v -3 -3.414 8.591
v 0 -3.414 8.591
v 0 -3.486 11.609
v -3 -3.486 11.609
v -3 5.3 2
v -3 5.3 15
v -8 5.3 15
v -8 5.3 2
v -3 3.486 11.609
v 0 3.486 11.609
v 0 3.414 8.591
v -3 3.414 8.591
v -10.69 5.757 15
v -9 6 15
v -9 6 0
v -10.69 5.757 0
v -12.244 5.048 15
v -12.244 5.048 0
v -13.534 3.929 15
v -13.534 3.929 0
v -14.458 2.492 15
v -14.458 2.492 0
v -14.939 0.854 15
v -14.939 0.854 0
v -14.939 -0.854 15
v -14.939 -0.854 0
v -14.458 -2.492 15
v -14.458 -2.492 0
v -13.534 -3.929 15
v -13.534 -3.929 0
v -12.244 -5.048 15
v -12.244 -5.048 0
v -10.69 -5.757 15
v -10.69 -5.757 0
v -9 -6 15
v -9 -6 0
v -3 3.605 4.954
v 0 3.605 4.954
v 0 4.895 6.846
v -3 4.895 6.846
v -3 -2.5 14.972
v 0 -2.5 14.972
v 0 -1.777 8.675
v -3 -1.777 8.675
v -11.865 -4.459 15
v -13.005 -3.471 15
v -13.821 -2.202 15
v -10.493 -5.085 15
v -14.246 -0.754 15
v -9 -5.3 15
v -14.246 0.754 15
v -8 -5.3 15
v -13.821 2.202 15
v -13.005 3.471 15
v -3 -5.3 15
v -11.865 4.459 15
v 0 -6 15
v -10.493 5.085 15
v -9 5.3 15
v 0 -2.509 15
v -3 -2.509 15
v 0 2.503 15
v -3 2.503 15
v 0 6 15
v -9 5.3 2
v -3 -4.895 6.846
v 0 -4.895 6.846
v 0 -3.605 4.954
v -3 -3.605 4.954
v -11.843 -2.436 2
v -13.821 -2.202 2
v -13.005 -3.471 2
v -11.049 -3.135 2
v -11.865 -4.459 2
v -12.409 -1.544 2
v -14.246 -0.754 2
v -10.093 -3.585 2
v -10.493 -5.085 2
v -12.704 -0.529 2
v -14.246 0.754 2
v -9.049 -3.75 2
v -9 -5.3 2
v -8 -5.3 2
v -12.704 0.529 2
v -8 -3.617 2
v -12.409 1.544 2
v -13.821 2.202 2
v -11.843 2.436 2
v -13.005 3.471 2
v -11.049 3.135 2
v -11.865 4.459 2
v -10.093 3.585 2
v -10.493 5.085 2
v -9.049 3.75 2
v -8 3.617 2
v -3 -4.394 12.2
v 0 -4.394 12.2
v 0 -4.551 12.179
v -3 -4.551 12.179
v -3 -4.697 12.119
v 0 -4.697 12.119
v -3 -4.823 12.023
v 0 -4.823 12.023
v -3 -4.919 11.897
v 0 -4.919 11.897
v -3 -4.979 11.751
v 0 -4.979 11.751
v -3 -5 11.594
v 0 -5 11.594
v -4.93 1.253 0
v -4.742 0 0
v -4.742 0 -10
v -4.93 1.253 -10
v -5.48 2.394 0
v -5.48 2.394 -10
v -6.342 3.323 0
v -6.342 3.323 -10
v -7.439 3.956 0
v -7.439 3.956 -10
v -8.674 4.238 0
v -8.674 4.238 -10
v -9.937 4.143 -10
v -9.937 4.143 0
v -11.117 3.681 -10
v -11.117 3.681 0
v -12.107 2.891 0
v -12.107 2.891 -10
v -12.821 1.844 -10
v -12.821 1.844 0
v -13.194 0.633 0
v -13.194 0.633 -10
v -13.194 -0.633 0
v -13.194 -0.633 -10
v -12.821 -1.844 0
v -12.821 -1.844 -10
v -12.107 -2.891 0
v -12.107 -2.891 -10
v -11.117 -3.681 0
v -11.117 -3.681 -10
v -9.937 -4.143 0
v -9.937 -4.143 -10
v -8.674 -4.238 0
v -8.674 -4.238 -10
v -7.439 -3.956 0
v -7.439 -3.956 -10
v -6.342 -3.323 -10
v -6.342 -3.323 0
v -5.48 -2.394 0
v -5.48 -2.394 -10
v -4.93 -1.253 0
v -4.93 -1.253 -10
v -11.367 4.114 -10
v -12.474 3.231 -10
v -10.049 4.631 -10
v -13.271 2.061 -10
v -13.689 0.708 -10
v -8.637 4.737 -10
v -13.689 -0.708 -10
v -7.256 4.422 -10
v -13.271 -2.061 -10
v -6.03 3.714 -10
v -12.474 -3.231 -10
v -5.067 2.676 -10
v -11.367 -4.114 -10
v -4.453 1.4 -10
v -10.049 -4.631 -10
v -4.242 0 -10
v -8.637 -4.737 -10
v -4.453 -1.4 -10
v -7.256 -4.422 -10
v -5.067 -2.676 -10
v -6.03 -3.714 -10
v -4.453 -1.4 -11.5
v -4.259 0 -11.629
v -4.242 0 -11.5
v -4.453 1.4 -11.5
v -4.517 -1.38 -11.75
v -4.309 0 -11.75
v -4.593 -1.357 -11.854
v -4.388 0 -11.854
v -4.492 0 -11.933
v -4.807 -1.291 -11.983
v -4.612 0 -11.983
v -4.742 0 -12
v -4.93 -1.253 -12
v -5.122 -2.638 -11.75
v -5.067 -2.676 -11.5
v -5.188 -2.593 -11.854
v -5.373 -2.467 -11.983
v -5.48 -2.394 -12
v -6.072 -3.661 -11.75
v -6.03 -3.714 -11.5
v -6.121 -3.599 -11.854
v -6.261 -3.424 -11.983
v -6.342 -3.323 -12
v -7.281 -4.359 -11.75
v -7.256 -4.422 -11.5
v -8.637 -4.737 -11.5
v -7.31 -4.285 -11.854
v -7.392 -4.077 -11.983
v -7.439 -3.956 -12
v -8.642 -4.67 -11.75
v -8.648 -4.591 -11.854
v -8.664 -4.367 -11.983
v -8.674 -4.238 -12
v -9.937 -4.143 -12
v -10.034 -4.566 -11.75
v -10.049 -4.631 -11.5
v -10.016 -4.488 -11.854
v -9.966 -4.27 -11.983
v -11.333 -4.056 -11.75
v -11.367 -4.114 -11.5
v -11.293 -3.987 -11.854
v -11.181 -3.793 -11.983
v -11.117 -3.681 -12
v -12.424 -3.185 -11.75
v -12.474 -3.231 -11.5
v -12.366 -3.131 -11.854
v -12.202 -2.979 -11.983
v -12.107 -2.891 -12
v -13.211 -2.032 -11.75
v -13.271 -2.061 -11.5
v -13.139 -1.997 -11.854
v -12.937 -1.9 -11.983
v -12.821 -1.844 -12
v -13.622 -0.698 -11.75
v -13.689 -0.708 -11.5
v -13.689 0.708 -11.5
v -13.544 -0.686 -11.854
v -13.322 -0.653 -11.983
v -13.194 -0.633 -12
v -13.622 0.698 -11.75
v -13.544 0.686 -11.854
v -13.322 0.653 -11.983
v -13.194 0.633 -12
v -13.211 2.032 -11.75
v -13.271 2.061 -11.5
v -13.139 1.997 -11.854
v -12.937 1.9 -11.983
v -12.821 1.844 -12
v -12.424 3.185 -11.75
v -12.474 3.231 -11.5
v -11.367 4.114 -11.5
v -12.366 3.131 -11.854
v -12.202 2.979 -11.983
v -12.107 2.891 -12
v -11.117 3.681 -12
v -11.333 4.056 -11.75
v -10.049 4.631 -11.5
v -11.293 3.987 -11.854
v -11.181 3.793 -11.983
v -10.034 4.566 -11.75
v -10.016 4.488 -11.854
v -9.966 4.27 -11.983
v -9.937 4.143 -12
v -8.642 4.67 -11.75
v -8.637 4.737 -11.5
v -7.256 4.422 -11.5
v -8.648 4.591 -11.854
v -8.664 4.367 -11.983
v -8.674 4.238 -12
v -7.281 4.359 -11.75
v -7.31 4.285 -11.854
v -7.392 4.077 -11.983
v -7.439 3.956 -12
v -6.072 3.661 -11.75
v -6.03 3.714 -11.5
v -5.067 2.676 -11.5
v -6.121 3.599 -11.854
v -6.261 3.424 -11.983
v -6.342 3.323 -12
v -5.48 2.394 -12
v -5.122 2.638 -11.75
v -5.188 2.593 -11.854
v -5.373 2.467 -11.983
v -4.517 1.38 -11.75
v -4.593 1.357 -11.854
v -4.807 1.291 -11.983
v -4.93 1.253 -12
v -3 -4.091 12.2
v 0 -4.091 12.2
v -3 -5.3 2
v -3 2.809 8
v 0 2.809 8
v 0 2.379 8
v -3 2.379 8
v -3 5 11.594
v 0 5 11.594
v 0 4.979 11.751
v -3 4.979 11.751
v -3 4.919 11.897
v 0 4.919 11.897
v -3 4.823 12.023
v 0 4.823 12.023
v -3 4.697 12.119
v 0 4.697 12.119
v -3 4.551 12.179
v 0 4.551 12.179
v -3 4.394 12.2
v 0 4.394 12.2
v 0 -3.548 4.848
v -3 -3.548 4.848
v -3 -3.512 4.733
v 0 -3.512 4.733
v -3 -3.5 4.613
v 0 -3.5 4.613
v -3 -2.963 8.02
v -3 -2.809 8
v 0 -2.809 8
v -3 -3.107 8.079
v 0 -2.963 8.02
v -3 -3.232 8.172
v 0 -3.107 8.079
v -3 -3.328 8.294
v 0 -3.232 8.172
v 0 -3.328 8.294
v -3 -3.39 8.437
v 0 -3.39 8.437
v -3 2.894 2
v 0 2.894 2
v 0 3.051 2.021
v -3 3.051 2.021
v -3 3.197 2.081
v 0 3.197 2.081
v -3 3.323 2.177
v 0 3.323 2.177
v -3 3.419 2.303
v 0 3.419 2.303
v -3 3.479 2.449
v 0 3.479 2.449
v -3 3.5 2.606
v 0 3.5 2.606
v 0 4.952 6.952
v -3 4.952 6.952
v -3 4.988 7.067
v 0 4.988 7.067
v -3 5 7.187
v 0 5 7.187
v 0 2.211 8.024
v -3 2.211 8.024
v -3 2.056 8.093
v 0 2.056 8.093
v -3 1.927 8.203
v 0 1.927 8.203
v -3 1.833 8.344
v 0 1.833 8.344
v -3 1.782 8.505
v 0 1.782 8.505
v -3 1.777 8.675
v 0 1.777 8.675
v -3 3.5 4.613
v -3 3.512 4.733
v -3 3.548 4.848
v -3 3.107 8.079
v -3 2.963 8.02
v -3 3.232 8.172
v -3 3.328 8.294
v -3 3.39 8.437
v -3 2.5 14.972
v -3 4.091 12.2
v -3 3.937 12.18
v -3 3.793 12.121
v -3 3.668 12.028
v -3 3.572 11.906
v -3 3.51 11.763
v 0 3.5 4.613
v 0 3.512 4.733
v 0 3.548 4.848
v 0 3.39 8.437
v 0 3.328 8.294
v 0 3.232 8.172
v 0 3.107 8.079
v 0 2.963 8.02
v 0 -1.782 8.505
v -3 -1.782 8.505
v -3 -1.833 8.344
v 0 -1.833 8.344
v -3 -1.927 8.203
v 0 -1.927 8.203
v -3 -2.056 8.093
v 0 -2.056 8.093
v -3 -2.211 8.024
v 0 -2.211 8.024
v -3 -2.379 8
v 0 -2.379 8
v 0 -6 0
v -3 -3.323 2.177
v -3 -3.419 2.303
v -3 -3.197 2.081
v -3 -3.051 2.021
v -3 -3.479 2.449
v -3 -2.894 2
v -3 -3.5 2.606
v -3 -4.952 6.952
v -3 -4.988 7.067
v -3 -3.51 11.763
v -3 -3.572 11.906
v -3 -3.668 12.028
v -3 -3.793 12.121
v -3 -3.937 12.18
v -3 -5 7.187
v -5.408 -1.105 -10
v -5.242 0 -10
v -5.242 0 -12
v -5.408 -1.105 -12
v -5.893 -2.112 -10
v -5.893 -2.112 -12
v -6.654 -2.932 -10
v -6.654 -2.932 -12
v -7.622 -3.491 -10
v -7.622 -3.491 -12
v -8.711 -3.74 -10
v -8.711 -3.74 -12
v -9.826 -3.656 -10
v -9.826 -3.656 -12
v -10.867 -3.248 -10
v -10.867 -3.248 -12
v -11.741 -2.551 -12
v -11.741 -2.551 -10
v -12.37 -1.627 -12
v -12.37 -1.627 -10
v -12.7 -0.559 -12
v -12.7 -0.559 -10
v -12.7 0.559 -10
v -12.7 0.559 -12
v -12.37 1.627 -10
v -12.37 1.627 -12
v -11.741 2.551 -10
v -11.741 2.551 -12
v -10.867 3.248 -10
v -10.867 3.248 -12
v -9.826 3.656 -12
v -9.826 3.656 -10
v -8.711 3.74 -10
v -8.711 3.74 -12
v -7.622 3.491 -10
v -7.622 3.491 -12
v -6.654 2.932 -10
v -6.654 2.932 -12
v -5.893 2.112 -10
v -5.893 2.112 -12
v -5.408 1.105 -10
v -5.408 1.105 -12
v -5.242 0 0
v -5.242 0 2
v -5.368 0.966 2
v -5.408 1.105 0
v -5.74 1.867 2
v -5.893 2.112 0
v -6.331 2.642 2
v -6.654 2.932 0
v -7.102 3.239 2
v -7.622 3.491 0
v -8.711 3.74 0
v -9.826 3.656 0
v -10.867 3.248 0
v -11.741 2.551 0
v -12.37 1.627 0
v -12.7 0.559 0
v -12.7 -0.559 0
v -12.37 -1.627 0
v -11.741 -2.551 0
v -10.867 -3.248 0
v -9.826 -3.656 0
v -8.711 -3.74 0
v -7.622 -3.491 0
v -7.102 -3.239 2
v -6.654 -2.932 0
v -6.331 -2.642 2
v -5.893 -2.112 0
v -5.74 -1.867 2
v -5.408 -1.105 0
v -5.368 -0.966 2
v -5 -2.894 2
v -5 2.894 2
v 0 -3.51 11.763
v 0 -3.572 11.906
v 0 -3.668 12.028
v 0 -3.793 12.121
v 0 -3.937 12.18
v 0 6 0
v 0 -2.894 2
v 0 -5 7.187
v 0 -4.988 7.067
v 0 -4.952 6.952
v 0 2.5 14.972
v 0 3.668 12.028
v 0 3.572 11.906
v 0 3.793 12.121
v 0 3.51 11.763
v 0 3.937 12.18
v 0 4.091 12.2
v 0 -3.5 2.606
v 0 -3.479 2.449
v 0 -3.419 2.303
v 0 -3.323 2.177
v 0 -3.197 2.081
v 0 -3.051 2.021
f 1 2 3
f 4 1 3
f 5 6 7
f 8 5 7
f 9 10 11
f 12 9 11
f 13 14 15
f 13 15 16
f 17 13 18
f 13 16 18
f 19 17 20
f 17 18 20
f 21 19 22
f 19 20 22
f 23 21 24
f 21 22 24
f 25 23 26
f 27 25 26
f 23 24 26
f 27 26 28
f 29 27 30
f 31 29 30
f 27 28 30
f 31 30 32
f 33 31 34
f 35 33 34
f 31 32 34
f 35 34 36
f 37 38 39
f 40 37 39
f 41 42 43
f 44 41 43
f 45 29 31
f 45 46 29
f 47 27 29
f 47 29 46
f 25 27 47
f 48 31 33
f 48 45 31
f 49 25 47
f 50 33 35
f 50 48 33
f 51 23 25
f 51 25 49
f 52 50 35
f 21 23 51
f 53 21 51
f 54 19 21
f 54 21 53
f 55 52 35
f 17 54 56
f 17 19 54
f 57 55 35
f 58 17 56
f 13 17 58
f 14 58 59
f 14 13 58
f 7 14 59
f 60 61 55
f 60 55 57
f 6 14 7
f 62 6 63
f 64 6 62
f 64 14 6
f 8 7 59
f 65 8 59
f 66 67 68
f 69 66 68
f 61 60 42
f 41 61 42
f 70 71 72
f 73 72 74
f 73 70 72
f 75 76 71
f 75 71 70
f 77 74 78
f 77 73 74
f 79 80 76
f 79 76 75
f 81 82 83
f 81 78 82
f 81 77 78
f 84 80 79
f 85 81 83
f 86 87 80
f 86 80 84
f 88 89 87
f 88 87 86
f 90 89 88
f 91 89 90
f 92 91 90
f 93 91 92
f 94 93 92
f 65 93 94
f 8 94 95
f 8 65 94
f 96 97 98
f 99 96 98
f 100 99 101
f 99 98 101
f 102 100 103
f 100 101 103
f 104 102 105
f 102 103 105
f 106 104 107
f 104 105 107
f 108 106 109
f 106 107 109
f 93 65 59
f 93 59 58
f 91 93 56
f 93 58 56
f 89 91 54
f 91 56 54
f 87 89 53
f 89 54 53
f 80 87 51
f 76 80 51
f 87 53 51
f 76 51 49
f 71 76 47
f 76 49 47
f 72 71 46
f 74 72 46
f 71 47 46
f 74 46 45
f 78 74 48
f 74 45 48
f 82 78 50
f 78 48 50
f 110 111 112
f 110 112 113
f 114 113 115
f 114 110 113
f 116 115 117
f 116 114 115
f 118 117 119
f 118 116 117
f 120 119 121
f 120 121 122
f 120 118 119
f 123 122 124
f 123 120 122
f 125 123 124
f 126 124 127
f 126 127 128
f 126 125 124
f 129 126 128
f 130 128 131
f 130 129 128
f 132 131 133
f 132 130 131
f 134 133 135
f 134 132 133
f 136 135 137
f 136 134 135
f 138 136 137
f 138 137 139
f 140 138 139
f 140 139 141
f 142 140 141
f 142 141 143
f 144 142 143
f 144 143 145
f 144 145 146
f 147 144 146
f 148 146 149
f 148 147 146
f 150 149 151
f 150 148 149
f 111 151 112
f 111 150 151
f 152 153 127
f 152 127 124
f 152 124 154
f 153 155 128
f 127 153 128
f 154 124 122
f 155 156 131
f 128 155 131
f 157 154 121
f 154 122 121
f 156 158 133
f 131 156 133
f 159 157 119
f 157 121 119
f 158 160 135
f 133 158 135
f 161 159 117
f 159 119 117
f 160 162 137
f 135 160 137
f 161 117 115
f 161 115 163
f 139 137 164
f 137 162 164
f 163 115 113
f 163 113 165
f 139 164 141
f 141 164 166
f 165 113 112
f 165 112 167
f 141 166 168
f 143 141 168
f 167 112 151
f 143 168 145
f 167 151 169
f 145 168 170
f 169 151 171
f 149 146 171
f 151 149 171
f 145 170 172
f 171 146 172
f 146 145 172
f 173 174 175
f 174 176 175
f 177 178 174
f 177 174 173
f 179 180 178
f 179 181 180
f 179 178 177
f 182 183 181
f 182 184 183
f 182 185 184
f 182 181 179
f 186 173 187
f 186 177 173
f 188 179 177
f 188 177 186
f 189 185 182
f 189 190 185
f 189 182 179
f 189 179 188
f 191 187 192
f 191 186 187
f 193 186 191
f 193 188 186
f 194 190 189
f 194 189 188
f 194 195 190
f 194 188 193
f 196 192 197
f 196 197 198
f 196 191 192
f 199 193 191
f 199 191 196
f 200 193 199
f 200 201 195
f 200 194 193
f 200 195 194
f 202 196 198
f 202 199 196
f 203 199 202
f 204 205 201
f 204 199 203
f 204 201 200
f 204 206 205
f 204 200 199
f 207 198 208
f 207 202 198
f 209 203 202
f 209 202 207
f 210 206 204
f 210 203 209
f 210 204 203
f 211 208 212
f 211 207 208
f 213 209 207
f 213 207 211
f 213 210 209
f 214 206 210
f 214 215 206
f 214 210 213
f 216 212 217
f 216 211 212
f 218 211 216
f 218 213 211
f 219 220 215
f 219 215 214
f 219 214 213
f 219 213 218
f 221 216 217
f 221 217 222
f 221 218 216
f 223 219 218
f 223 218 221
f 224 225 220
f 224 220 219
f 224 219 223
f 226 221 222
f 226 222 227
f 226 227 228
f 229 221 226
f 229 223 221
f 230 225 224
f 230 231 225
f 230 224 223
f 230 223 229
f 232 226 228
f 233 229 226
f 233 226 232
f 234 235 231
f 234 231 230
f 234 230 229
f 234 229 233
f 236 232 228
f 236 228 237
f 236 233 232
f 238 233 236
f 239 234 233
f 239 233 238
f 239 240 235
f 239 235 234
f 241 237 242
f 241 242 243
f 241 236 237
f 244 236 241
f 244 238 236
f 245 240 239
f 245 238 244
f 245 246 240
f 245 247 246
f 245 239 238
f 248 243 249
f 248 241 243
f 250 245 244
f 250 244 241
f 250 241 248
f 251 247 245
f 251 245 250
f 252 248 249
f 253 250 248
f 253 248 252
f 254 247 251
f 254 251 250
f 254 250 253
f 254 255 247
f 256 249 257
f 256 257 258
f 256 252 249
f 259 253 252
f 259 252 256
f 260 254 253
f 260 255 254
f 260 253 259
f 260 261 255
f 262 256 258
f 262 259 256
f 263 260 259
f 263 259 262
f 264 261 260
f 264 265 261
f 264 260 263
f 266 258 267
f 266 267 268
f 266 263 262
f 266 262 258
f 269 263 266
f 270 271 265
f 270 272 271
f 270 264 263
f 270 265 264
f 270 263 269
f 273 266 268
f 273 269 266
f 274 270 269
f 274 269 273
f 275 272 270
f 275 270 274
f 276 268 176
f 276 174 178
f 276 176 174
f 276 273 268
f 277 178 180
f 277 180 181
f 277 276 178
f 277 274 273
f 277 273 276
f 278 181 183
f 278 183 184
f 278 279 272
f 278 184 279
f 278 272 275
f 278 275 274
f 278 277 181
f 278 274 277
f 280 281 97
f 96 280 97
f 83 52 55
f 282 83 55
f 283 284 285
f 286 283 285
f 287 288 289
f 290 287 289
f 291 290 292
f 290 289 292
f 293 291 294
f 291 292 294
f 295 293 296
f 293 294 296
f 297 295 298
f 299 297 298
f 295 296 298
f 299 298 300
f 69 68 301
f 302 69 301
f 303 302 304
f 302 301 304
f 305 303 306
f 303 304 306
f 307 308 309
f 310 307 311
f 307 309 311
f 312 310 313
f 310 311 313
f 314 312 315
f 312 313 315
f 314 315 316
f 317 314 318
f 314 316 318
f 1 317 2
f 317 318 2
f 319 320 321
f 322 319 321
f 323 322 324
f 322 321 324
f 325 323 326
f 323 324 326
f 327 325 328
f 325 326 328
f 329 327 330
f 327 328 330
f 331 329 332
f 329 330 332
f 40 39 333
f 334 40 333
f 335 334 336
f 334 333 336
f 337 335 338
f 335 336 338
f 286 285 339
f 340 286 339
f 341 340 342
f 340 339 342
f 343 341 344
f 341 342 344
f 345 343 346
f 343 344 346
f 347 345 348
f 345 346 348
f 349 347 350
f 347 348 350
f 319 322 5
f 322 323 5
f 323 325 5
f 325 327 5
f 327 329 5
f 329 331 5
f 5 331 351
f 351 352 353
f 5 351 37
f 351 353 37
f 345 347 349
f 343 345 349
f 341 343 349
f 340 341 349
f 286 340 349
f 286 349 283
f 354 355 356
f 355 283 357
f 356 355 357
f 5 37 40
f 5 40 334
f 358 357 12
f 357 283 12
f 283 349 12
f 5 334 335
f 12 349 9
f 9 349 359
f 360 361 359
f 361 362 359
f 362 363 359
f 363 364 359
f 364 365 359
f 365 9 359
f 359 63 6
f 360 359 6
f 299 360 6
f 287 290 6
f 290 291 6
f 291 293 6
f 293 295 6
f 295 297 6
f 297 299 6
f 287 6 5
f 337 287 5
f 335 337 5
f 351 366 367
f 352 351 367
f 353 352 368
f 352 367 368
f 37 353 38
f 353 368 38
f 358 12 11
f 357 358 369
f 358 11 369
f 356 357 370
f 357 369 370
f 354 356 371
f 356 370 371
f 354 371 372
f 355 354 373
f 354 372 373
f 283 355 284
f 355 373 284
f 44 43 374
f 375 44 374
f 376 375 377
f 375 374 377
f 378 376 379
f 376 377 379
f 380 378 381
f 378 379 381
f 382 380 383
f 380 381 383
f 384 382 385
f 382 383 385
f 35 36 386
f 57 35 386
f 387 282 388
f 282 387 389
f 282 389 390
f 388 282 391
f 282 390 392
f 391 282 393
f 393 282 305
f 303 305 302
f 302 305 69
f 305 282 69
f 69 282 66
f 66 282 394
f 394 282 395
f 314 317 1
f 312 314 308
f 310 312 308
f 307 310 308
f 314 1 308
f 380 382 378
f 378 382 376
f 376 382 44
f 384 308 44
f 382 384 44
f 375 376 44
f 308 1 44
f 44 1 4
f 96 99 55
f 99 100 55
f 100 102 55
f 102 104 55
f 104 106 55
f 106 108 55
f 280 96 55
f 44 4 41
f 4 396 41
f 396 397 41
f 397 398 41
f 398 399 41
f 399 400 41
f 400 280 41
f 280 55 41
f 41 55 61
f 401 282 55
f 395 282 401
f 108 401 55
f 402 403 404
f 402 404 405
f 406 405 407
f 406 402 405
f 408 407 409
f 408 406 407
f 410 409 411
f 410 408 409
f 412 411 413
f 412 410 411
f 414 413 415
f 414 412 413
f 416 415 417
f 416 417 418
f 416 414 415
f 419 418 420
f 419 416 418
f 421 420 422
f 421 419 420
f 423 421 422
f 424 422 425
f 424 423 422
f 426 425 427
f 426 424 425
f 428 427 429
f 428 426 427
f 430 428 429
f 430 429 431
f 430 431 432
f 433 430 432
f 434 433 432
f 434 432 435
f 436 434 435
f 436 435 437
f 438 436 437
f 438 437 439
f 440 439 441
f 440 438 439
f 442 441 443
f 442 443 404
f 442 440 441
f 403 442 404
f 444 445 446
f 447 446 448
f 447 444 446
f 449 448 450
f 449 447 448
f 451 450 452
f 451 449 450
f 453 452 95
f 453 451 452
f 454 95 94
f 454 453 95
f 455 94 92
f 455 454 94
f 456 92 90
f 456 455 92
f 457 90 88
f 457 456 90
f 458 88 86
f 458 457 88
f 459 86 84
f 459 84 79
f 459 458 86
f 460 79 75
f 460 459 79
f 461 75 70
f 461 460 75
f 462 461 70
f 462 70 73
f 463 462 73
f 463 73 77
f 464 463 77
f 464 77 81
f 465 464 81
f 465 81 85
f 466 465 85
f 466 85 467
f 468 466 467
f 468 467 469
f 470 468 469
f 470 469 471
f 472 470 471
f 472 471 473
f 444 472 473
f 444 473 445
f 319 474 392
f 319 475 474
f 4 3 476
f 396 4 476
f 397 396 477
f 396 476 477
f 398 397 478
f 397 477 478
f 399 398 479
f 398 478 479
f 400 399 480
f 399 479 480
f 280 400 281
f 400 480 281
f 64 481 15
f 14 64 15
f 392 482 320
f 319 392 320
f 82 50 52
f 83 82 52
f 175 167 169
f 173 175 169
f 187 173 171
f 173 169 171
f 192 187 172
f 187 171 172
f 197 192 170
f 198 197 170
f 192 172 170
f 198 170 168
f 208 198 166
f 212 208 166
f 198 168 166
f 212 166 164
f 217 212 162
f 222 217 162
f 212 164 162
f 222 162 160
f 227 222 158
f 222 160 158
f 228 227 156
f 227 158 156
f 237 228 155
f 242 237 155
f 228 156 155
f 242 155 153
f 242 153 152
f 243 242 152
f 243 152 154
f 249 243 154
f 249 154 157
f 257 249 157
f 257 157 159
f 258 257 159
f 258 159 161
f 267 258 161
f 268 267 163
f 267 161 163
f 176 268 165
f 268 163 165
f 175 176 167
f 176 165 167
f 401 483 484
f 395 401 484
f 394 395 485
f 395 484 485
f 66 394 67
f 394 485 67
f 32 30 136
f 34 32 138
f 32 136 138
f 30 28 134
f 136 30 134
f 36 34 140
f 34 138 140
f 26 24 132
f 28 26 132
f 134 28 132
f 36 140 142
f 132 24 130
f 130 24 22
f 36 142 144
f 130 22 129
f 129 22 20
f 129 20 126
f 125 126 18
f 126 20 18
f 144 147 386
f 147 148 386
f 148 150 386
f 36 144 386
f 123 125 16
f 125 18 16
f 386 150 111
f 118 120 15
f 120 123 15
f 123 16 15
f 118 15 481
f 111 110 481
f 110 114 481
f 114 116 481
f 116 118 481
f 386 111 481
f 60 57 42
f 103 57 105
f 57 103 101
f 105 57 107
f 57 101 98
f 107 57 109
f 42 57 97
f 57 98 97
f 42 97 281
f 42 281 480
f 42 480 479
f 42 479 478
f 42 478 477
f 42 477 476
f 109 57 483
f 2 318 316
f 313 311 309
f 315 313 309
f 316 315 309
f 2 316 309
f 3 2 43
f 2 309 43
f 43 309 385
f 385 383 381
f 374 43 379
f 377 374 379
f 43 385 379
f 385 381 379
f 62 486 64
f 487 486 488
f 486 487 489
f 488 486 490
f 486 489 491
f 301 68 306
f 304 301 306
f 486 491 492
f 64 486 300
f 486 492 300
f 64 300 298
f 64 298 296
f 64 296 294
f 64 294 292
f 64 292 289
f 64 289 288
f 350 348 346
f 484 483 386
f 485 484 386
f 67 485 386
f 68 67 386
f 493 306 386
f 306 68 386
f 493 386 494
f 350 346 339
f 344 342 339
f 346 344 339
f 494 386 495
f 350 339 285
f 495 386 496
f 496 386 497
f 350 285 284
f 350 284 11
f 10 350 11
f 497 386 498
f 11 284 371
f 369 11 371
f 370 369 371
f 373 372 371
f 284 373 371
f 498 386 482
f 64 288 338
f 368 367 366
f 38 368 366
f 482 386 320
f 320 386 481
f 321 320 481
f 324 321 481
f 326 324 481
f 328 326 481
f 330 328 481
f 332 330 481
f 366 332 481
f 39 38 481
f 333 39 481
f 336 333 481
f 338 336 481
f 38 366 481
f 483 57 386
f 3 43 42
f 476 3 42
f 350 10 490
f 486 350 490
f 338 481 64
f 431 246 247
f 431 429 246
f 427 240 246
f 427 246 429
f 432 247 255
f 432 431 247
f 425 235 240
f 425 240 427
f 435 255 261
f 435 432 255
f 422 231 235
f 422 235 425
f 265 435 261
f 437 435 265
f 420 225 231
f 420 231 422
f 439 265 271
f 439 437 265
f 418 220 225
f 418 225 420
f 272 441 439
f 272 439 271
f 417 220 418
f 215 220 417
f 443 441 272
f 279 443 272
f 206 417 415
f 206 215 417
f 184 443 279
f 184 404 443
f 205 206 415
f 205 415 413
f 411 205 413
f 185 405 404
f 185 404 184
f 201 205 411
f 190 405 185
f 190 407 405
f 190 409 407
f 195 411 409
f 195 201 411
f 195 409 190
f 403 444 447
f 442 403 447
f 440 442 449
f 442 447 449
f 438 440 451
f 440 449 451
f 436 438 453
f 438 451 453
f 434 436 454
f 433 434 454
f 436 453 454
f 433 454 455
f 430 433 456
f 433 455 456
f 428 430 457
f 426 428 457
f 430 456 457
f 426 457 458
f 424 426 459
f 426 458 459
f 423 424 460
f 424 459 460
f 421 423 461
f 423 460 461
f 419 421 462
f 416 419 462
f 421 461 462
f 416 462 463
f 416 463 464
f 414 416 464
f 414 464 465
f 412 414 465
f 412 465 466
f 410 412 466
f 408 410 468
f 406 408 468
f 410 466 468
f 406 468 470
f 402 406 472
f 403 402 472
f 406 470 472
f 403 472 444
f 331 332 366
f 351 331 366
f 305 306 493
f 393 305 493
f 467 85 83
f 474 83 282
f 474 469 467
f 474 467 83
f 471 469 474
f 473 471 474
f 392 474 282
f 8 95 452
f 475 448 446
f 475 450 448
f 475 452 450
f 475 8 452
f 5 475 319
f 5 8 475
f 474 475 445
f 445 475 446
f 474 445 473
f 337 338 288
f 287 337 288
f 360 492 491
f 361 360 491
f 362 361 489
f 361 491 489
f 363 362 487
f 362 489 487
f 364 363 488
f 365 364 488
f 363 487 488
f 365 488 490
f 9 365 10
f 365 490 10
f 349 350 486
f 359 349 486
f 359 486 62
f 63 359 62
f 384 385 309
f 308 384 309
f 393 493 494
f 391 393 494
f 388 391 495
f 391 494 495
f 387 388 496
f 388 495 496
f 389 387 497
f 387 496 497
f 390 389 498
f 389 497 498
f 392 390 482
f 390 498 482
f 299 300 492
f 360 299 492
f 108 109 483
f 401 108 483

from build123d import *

# Parameters (mm, degrees)
F1_DEPTH  = 15
F2_R      = 4.25
F2_R_2    = 3.75
F3_DEPTH  = 10
F4_R      = 4.75
F4_R_2    = 4.25
F4_R_3    = 3.75
F5_DEPTH  = 2
F7_DEPTH  = 13
F8_DEPTH  = 2
F7_FACE_W = 10.6
F7_FACE_H = 13
F10_DEPTH = 5
F11_R     = 0.5


with BuildPart() as f1:
    # F0 (on Top) → F1 (new body)
    with BuildSketch(Plane.XY):
        with BuildLine():
            Line((0, 6), (-9, 6))
            ThreePointArc((-9, 6), (-15, 0), (-9, -6))
            Line((-9, -6), (0, -6))
            Line((0, -6), (0, 6))
        make_face()
    extrude(amount=F1_DEPTH)

    # F2 (on Top) → F3 (join)
    with BuildSketch(Plane.XY):
        with Locations((-8.9916, 0)):
            Circle(F2_R)
        with Locations((-8.9916, 0)):
            Circle(F2_R_2, mode=Mode.SUBTRACT)
    extrude(amount=-F3_DEPTH)

    # F4 (on face) → F5 (join)
    with BuildSketch(Plane(origin=(0, 0, -10), x_dir=(1, 0, 0), z_dir=(0, 0, -1))):
        with Locations((-8.9916, 0)):
            Circle(F4_R)
        with Locations((-8.9916, 0)):
            Circle(F4_R_2, mode=Mode.SUBTRACT)
        with Locations((-8.9916, 0)):
            Circle(F4_R_2)
        with Locations((-8.9916, 0)):
            Circle(F4_R_3, mode=Mode.SUBTRACT)
    extrude(amount=F5_DEPTH)

    # F6 (on face) → F7 (cut)
    with BuildSketch(Plane.XY.offset(15)):
        with BuildLine():
            Line((-3, -5.3), (-3, 5.3))
            Line((-3, 5.3), (-9, 5.3))
            ThreePointArc((-9, 5.3), (-14.3, 0), (-9, -5.3))
            Line((-9, -5.3), (-3, -5.3))
        make_face()
    extrude(amount=-F7_DEPTH, mode=Mode.SUBTRACT)

    # F8 (cut, through all): a face of the model
    f8_faces = [f1.faces().sort_by_distance(p)[0] for p in [
        (-8.9916, 0, 0),
    ]]
    extrude(f8_faces, amount=-F8_DEPTH, mode=Mode.SUBTRACT)

    # F9 (on face) + F7_face (on face) → F10 (cut)
    with BuildSketch(Plane.YZ):
        with BuildLine():
            Line((-3.5, 4.6132088465), (-3.5, 2.6055402327))
            ThreePointArc((-3.5, 2.6055402327), (-3.3226413721, 2.1773586279), (-2.8944597673, 2))
            Line((-2.8944597673, 2), (0, 2))
            Line((0, 2), (2.8944597673, 2))
            ThreePointArc((2.8944597673, 2), (3.3226413721, 2.1773586279), (3.5, 2.6055402327))
            Line((3.5, 2.6055402327), (3.5, 4.6132088465))
            ThreePointArc((3.5, 4.6132088465), (3.5269042645, 4.7917008345), (3.6052263353, 4.9543319584))
            Line((3.6052263353, 4.9543319584), (4.8947736647, 6.8456680416))
            ThreePointArc((4.8947736647, 6.8456680416), (4.9730957355, 7.0082991655), (5, 7.1867911535))
            Line((5, 7.1867911535), (5, 11.5944597673))
            ThreePointArc((5, 11.5944597673), (4.8226413721, 12.0226413721), (4.3944597673, 12.2))
            Line((4.3944597673, 12.2), (4.0912942222, 12.2))
            ThreePointArc((4.0912942222, 12.2), (3.668239264, 12.0277073591), (3.4859255549, 11.608873307))
            Line((3.4859255549, 11.608873307), (3.4140744451, 8.591126693))
            ThreePointArc((3.4140744451, 8.591126693), (3.231760736, 8.1722926409), (2.8087057778, 8))
            Line((2.8087057778, 8), (2.3789951326, 8))
            ThreePointArc((2.3789951326, 8), (1.9270666838, 8.2025022065), (1.7774022402, 8.6745689611))
            Line((1.7774022402, 8.6745689611), (2.5, 14.9720872054))
            Line((2.5, 14.9720872054), (2.503202805, 15))
            Line((2.503202805, 15), (-2.5090757857, 15))
            Line((-2.5090757857, 15), (-2.5, 14.9720872054))
            Line((-2.5, 14.9720872054), (-1.7774022402, 8.6745689611))
            ThreePointArc((-1.7774022402, 8.6745689611), (-1.9270666838, 8.2025022065), (-2.3789951326, 8))
            Line((-2.3789951326, 8), (-2.8087057778, 8))
            ThreePointArc((-2.8087057778, 8), (-3.231760736, 8.1722926409), (-3.4140744451, 8.591126693))
            Line((-3.4140744451, 8.591126693), (-3.4859255549, 11.608873307))
            ThreePointArc((-3.4859255549, 11.608873307), (-3.668239264, 12.0277073591), (-4.0912942222, 12.2))
            Line((-4.0912942222, 12.2), (-4.3944597673, 12.2))
            ThreePointArc((-4.3944597673, 12.2), (-4.8226413721, 12.0226413721), (-5, 11.5944597673))
            Line((-5, 11.5944597673), (-5, 7.1867911535))
            ThreePointArc((-5, 7.1867911535), (-4.9730957355, 7.0082991655), (-4.8947736647, 6.8456680416))
            Line((-4.8947736647, 6.8456680416), (-3.6052263353, 4.9543319584))
            ThreePointArc((-3.6052263353, 4.9543319584), (-3.5269042645, 4.7917008345), (-3.5, 4.6132088465))
        make_face()
    with BuildSketch(Plane(origin=(-3, 0, 8.5), x_dir=(0, -1, 0), z_dir=(-1, 0, 0))):
        Rectangle(F7_FACE_W, F7_FACE_H)
    extrude(amount=-F10_DEPTH, dir=(1, 0, 0), mode=Mode.SUBTRACT)

    # F11
    f11_edges = [f1.edges().sort_by_distance(p)[0] for p in [
        (-13.7416, 0, -12),
    ]]
    fillet(f11_edges, radius=F11_R)


solid = f1.part
